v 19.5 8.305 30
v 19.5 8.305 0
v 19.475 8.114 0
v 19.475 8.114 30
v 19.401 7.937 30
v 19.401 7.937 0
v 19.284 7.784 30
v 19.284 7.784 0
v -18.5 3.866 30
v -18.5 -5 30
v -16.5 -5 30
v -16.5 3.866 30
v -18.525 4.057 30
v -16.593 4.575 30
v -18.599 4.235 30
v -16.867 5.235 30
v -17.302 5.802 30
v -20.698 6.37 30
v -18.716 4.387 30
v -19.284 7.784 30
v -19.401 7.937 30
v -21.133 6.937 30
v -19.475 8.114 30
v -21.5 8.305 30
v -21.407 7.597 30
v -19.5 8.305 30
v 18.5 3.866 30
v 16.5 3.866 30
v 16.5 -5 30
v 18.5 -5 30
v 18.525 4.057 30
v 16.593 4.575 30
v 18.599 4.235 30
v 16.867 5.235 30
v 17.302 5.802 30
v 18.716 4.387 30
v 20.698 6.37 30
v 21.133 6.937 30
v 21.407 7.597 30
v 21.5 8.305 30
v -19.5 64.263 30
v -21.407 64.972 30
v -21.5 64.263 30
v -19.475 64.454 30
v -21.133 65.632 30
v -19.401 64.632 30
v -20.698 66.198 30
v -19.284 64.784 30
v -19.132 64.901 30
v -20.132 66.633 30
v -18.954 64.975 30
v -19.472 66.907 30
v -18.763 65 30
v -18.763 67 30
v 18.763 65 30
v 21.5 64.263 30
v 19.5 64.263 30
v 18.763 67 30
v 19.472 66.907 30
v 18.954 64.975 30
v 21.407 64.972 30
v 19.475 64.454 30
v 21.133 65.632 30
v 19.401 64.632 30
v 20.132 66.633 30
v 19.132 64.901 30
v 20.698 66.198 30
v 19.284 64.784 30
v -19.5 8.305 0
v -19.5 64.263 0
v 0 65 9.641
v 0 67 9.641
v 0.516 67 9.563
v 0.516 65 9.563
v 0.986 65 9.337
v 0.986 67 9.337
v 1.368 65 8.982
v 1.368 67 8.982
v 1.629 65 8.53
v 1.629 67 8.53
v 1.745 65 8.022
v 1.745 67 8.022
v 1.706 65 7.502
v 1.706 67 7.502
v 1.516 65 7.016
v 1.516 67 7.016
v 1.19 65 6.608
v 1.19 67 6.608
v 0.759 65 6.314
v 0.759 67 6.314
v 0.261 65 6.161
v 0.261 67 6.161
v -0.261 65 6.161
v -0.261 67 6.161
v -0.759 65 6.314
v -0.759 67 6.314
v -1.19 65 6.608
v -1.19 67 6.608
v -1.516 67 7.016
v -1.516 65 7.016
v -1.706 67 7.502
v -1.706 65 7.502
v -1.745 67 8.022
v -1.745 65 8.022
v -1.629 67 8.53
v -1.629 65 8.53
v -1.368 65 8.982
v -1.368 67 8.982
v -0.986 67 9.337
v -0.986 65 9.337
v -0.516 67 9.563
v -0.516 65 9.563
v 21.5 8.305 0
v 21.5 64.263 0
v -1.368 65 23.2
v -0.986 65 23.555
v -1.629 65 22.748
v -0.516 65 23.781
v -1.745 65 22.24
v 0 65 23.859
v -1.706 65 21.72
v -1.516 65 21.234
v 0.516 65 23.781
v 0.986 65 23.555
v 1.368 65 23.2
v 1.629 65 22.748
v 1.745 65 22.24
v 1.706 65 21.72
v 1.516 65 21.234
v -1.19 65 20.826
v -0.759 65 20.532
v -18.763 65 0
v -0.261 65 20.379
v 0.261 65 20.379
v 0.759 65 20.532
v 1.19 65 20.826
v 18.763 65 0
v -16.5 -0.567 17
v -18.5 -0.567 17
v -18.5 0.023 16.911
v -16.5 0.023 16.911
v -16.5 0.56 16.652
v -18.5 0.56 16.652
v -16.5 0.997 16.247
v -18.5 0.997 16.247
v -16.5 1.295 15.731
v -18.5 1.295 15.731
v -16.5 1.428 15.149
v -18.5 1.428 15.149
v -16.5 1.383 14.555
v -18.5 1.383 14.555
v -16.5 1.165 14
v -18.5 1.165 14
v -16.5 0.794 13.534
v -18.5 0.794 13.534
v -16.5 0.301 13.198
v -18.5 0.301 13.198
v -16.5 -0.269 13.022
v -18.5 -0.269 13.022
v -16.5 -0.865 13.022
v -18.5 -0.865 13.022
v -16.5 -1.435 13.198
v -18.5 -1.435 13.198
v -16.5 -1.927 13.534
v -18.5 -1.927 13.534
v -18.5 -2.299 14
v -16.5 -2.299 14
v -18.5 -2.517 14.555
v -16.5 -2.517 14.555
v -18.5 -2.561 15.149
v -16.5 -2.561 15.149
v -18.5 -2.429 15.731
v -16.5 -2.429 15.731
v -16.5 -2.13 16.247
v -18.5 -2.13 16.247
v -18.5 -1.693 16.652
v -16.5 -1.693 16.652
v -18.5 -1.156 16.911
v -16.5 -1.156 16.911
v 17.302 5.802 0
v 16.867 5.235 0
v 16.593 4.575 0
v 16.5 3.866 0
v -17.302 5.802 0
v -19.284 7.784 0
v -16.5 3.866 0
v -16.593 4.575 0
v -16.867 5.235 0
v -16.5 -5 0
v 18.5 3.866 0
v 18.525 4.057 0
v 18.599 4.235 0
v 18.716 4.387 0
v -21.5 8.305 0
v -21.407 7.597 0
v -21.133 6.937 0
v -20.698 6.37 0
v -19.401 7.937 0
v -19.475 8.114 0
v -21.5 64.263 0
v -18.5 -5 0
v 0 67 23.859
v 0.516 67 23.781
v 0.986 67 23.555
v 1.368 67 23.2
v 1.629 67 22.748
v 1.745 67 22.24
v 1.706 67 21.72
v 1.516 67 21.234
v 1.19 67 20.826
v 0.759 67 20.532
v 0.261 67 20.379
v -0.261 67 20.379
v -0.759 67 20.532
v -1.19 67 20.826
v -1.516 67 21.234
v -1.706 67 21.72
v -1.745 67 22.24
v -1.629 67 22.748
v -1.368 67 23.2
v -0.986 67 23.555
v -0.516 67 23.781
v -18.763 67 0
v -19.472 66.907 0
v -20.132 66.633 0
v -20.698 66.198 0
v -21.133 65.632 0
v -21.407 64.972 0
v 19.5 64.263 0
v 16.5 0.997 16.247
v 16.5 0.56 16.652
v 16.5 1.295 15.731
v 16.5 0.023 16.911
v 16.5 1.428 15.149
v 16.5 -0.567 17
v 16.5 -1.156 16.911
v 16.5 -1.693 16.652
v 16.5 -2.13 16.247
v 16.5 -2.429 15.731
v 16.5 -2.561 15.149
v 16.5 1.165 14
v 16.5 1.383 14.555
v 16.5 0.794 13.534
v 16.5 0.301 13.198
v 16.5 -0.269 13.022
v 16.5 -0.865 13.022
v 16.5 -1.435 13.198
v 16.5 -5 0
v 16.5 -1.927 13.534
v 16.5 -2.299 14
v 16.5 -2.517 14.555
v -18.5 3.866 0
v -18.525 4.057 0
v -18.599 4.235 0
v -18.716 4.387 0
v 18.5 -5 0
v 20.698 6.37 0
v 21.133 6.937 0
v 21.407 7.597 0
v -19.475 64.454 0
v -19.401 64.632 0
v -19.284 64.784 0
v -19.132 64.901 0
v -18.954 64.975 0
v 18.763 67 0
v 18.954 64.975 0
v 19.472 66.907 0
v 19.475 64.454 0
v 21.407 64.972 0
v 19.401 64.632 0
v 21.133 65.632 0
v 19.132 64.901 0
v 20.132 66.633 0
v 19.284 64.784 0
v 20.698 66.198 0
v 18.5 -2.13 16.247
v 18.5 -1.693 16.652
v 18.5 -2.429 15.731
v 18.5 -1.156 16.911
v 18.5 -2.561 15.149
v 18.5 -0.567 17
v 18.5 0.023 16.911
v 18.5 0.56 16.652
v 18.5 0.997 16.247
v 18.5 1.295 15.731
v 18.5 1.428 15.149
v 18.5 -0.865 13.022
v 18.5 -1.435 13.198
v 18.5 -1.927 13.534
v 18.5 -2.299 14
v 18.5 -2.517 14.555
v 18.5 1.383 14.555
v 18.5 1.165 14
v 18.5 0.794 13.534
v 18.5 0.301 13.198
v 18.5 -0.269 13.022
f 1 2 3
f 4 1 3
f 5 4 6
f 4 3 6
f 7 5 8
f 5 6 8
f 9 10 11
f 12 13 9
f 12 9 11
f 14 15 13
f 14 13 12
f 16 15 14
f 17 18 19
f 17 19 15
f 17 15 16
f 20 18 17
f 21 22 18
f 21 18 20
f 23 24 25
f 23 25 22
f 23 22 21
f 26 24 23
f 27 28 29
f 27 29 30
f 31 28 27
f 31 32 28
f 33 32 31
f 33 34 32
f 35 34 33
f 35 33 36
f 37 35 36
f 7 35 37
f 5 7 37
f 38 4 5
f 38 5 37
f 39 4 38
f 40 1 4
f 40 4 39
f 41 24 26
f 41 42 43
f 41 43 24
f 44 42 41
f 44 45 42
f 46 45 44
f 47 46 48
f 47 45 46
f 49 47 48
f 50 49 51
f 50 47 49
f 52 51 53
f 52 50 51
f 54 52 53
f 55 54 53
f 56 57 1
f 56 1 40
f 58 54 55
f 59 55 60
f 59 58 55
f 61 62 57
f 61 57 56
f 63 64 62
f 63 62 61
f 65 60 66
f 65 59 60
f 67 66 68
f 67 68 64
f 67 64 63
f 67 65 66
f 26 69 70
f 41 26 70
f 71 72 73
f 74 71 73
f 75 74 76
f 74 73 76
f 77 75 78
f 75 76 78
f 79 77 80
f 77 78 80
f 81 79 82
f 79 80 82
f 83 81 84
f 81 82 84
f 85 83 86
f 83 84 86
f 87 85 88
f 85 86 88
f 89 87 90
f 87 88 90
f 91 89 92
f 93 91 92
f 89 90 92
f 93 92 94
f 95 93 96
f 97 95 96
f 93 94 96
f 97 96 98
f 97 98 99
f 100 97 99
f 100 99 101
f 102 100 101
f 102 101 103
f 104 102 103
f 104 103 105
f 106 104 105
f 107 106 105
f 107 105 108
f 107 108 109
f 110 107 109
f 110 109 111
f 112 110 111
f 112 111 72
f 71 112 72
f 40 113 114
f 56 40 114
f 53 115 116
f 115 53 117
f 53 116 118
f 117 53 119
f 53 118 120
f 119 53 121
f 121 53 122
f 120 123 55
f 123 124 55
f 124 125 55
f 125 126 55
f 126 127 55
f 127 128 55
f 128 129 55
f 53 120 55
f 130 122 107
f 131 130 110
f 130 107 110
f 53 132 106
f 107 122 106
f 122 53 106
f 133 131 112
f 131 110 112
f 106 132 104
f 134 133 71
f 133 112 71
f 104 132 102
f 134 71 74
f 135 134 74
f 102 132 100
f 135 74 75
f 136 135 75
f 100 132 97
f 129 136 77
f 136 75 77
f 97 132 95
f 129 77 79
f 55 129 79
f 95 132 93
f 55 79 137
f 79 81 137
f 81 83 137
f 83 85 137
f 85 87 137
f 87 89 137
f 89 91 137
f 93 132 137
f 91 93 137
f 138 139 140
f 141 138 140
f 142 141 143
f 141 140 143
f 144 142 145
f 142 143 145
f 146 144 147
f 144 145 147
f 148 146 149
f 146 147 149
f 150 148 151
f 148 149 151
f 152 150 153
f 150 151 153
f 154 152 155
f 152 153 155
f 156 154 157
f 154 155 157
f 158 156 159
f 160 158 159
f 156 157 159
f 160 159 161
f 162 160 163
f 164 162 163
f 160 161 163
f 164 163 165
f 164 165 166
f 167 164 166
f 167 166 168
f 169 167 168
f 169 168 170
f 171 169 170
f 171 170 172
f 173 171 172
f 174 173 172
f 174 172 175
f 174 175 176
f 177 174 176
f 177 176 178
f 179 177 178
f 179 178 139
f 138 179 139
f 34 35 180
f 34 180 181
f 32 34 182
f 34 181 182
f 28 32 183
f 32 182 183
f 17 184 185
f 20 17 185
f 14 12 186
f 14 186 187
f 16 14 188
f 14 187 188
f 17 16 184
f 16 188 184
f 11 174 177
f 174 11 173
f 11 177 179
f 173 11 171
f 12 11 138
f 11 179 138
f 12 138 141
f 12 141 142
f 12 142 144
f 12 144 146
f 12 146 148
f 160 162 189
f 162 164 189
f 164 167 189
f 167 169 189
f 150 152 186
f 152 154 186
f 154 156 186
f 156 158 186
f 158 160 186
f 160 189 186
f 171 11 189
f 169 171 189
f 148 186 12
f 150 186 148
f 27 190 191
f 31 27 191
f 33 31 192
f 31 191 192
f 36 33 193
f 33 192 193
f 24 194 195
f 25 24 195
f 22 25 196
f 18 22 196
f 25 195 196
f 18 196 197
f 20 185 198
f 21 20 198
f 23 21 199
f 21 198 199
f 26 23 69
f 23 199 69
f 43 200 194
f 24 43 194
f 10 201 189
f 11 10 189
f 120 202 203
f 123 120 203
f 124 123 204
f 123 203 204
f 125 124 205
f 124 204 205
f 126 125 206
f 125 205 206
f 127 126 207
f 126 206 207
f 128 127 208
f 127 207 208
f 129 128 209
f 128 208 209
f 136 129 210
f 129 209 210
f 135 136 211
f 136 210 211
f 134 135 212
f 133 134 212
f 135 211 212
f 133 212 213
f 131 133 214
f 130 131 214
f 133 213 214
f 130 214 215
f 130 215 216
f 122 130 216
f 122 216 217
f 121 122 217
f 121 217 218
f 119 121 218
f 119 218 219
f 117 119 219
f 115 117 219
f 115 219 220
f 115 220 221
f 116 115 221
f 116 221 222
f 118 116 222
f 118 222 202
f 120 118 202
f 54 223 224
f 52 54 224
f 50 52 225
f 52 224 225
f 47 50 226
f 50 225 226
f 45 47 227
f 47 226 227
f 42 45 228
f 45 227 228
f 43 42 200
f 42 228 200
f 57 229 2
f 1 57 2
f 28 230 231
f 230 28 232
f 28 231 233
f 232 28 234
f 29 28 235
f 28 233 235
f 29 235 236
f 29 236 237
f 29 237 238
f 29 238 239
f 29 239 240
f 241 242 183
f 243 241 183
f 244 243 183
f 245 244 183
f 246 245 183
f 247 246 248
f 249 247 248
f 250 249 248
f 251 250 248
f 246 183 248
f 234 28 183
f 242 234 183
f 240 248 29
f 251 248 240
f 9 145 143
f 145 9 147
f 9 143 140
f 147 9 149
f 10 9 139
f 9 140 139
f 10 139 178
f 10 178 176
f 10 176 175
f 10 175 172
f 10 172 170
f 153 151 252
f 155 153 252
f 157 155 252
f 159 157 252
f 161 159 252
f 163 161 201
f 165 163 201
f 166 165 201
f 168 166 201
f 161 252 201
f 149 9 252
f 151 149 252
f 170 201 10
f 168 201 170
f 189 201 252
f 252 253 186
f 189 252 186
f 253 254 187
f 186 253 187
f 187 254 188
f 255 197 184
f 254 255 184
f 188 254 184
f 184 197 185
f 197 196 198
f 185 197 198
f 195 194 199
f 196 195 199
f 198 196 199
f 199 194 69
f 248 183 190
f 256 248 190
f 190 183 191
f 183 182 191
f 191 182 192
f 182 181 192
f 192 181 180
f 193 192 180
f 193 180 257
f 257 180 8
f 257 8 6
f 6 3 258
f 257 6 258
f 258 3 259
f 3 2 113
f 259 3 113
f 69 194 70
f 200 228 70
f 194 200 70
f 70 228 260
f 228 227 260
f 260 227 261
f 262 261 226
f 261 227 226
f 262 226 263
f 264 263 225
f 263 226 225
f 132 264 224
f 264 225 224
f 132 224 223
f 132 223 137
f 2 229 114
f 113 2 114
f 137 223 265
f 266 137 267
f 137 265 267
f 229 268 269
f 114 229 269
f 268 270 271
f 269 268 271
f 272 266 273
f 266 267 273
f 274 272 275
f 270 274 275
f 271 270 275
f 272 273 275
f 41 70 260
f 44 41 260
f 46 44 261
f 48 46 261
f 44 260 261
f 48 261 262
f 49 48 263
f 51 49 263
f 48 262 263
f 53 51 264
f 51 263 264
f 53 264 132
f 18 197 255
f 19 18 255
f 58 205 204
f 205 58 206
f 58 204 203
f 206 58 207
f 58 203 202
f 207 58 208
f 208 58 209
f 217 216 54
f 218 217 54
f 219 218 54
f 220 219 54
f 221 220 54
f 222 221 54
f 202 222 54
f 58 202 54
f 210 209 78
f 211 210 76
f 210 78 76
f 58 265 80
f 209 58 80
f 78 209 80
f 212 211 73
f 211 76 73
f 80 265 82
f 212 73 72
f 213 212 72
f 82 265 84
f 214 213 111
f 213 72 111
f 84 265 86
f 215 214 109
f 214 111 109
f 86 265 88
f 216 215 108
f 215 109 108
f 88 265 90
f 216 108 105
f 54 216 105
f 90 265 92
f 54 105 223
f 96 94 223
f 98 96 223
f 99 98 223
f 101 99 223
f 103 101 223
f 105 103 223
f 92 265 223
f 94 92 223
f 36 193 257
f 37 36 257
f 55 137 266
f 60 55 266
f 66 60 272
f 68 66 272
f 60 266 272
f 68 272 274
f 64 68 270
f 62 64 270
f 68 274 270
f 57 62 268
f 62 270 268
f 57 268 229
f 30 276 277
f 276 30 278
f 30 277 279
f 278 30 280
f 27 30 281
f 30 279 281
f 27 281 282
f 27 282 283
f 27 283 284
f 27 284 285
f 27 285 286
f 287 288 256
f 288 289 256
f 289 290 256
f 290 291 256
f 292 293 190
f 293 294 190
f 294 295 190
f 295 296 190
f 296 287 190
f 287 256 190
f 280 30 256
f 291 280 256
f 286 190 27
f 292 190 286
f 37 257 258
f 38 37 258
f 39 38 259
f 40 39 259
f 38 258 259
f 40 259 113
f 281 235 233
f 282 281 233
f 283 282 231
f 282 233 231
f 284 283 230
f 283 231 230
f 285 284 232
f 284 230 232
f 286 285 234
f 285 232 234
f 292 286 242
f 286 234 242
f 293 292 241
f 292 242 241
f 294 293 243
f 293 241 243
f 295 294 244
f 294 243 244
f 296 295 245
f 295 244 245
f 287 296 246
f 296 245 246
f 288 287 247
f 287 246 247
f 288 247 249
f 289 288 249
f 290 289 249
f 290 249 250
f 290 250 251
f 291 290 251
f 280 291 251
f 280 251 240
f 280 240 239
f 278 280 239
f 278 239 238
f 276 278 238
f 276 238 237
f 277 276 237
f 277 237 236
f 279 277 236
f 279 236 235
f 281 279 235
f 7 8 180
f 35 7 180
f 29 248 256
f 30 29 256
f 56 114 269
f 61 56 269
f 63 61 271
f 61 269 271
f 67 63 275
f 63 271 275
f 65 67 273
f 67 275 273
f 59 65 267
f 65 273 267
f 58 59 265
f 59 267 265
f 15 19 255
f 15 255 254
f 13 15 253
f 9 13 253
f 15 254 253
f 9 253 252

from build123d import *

# Parameters (mm, degrees)
BASE_FLANGE1_DEPTH = 30
SKETCH9_R          = 2
CUT_EXTRUDE1_DEPTH = 84.600239234
SKETCH10_R         = 1.75
CUT_EXTRUDE2_DEPTH = 10


# Sheet-metal steps are written as plain solids
with BuildPart() as part:
    # Sketch1 → Base-Flange1 (new body)
    with BuildSketch(Plane.XY):
        with BuildLine():
            Line((-16.5, -5), (-16.5, 3.866463165))
            ThreePointArc((-16.5, 3.866463165), (-16.708311271, 4.913714646), (-17.301531583, 5.801531583))
            Line((-17.301531583, 5.801531583), (-19.284254855, 7.784254855))
            ThreePointArc((-19.284254855, 7.784254855), (-19.443929664, 8.023225094), (-19.5, 8.30510971))
            Line((-19.5, 8.30510971), (-19.5, 64.2634))
            ThreePointArc((-19.5, 64.2634), (-19.284254855, 64.784254855), (-18.7634, 65))
            Line((-18.7634, 65), (18.7634, 65))
            ThreePointArc((18.7634, 65), (19.284254855, 64.784254855), (19.5, 64.2634))
            Line((19.5, 64.2634), (19.5, 8.30510971))
            ThreePointArc((19.5, 8.30510971), (19.443929664, 8.023225094), (19.284254855, 7.784254855))
            Line((19.284254855, 7.784254855), (17.301531583, 5.801531583))
            ThreePointArc((17.301531583, 5.801531583), (16.708311271, 4.913714646), (16.5, 3.866463165))
            Line((16.5, 3.866463165), (16.5, -5))
            Line((16.5, -5), (18.5, -5))
            Line((18.5, -5), (18.5, 3.866463165))
            ThreePointArc((18.5, 3.866463165), (18.556070336, 4.148347781), (18.715745145, 4.38731802))
            Line((18.715745145, 4.38731802), (20.698468417, 6.370041293))
            ThreePointArc((20.698468417, 6.370041293), (21.291688729, 7.257858229), (21.5, 8.30510971))
            Line((21.5, 8.30510971), (21.5, 64.2634))
            ThreePointArc((21.5, 64.2634), (20.698468417, 66.198468417), (18.7634, 67))
            Line((18.7634, 67), (-18.7634, 67))
            ThreePointArc((-18.7634, 67), (-20.698468417, 66.198468417), (-21.5, 64.2634))
            Line((-21.5, 64.2634), (-21.5, 8.30510971))
            ThreePointArc((-21.5, 8.30510971), (-21.291688729, 7.257858229), (-20.698468417, 6.370041293))
            Line((-20.698468417, 6.370041293), (-18.715745145, 4.38731802))
            ThreePointArc((-18.715745145, 4.38731802), (-18.556070336, 4.148347781), (-18.5, 3.866463165))
            Line((-18.5, 3.866463165), (-18.5, -5))
            Line((-18.5, -5), (-16.5, -5))
        make_face()
    extrude(amount=BASE_FLANGE1_DEPTH)

    # Sketch9 → Cut-Extrude1 (cut, through all)
    with BuildSketch(Plane.ZY.offset(18.5)):
        with Locations((15, -0.566768417)):
            Circle(SKETCH9_R)
    extrude(amount=-CUT_EXTRUDE1_DEPTH, mode=Mode.SUBTRACT)

    # Sketch10 → Cut-Extrude2 (cut)
    with BuildSketch(Plane(origin=(0, 67, 0), x_dir=(1, 0, 0), z_dir=(0, 1, 0))):
        with Locations(Location((0, -22.108972385, 0), (0, 0, 270))):
            Circle(SKETCH10_R)
        with Locations(Location((0, -7.891027615, 0), (0, 0, 270))):
            Circle(SKETCH10_R)
    extrude(amount=-CUT_EXTRUDE2_DEPTH, mode=Mode.SUBTRACT)


solid = part.part
